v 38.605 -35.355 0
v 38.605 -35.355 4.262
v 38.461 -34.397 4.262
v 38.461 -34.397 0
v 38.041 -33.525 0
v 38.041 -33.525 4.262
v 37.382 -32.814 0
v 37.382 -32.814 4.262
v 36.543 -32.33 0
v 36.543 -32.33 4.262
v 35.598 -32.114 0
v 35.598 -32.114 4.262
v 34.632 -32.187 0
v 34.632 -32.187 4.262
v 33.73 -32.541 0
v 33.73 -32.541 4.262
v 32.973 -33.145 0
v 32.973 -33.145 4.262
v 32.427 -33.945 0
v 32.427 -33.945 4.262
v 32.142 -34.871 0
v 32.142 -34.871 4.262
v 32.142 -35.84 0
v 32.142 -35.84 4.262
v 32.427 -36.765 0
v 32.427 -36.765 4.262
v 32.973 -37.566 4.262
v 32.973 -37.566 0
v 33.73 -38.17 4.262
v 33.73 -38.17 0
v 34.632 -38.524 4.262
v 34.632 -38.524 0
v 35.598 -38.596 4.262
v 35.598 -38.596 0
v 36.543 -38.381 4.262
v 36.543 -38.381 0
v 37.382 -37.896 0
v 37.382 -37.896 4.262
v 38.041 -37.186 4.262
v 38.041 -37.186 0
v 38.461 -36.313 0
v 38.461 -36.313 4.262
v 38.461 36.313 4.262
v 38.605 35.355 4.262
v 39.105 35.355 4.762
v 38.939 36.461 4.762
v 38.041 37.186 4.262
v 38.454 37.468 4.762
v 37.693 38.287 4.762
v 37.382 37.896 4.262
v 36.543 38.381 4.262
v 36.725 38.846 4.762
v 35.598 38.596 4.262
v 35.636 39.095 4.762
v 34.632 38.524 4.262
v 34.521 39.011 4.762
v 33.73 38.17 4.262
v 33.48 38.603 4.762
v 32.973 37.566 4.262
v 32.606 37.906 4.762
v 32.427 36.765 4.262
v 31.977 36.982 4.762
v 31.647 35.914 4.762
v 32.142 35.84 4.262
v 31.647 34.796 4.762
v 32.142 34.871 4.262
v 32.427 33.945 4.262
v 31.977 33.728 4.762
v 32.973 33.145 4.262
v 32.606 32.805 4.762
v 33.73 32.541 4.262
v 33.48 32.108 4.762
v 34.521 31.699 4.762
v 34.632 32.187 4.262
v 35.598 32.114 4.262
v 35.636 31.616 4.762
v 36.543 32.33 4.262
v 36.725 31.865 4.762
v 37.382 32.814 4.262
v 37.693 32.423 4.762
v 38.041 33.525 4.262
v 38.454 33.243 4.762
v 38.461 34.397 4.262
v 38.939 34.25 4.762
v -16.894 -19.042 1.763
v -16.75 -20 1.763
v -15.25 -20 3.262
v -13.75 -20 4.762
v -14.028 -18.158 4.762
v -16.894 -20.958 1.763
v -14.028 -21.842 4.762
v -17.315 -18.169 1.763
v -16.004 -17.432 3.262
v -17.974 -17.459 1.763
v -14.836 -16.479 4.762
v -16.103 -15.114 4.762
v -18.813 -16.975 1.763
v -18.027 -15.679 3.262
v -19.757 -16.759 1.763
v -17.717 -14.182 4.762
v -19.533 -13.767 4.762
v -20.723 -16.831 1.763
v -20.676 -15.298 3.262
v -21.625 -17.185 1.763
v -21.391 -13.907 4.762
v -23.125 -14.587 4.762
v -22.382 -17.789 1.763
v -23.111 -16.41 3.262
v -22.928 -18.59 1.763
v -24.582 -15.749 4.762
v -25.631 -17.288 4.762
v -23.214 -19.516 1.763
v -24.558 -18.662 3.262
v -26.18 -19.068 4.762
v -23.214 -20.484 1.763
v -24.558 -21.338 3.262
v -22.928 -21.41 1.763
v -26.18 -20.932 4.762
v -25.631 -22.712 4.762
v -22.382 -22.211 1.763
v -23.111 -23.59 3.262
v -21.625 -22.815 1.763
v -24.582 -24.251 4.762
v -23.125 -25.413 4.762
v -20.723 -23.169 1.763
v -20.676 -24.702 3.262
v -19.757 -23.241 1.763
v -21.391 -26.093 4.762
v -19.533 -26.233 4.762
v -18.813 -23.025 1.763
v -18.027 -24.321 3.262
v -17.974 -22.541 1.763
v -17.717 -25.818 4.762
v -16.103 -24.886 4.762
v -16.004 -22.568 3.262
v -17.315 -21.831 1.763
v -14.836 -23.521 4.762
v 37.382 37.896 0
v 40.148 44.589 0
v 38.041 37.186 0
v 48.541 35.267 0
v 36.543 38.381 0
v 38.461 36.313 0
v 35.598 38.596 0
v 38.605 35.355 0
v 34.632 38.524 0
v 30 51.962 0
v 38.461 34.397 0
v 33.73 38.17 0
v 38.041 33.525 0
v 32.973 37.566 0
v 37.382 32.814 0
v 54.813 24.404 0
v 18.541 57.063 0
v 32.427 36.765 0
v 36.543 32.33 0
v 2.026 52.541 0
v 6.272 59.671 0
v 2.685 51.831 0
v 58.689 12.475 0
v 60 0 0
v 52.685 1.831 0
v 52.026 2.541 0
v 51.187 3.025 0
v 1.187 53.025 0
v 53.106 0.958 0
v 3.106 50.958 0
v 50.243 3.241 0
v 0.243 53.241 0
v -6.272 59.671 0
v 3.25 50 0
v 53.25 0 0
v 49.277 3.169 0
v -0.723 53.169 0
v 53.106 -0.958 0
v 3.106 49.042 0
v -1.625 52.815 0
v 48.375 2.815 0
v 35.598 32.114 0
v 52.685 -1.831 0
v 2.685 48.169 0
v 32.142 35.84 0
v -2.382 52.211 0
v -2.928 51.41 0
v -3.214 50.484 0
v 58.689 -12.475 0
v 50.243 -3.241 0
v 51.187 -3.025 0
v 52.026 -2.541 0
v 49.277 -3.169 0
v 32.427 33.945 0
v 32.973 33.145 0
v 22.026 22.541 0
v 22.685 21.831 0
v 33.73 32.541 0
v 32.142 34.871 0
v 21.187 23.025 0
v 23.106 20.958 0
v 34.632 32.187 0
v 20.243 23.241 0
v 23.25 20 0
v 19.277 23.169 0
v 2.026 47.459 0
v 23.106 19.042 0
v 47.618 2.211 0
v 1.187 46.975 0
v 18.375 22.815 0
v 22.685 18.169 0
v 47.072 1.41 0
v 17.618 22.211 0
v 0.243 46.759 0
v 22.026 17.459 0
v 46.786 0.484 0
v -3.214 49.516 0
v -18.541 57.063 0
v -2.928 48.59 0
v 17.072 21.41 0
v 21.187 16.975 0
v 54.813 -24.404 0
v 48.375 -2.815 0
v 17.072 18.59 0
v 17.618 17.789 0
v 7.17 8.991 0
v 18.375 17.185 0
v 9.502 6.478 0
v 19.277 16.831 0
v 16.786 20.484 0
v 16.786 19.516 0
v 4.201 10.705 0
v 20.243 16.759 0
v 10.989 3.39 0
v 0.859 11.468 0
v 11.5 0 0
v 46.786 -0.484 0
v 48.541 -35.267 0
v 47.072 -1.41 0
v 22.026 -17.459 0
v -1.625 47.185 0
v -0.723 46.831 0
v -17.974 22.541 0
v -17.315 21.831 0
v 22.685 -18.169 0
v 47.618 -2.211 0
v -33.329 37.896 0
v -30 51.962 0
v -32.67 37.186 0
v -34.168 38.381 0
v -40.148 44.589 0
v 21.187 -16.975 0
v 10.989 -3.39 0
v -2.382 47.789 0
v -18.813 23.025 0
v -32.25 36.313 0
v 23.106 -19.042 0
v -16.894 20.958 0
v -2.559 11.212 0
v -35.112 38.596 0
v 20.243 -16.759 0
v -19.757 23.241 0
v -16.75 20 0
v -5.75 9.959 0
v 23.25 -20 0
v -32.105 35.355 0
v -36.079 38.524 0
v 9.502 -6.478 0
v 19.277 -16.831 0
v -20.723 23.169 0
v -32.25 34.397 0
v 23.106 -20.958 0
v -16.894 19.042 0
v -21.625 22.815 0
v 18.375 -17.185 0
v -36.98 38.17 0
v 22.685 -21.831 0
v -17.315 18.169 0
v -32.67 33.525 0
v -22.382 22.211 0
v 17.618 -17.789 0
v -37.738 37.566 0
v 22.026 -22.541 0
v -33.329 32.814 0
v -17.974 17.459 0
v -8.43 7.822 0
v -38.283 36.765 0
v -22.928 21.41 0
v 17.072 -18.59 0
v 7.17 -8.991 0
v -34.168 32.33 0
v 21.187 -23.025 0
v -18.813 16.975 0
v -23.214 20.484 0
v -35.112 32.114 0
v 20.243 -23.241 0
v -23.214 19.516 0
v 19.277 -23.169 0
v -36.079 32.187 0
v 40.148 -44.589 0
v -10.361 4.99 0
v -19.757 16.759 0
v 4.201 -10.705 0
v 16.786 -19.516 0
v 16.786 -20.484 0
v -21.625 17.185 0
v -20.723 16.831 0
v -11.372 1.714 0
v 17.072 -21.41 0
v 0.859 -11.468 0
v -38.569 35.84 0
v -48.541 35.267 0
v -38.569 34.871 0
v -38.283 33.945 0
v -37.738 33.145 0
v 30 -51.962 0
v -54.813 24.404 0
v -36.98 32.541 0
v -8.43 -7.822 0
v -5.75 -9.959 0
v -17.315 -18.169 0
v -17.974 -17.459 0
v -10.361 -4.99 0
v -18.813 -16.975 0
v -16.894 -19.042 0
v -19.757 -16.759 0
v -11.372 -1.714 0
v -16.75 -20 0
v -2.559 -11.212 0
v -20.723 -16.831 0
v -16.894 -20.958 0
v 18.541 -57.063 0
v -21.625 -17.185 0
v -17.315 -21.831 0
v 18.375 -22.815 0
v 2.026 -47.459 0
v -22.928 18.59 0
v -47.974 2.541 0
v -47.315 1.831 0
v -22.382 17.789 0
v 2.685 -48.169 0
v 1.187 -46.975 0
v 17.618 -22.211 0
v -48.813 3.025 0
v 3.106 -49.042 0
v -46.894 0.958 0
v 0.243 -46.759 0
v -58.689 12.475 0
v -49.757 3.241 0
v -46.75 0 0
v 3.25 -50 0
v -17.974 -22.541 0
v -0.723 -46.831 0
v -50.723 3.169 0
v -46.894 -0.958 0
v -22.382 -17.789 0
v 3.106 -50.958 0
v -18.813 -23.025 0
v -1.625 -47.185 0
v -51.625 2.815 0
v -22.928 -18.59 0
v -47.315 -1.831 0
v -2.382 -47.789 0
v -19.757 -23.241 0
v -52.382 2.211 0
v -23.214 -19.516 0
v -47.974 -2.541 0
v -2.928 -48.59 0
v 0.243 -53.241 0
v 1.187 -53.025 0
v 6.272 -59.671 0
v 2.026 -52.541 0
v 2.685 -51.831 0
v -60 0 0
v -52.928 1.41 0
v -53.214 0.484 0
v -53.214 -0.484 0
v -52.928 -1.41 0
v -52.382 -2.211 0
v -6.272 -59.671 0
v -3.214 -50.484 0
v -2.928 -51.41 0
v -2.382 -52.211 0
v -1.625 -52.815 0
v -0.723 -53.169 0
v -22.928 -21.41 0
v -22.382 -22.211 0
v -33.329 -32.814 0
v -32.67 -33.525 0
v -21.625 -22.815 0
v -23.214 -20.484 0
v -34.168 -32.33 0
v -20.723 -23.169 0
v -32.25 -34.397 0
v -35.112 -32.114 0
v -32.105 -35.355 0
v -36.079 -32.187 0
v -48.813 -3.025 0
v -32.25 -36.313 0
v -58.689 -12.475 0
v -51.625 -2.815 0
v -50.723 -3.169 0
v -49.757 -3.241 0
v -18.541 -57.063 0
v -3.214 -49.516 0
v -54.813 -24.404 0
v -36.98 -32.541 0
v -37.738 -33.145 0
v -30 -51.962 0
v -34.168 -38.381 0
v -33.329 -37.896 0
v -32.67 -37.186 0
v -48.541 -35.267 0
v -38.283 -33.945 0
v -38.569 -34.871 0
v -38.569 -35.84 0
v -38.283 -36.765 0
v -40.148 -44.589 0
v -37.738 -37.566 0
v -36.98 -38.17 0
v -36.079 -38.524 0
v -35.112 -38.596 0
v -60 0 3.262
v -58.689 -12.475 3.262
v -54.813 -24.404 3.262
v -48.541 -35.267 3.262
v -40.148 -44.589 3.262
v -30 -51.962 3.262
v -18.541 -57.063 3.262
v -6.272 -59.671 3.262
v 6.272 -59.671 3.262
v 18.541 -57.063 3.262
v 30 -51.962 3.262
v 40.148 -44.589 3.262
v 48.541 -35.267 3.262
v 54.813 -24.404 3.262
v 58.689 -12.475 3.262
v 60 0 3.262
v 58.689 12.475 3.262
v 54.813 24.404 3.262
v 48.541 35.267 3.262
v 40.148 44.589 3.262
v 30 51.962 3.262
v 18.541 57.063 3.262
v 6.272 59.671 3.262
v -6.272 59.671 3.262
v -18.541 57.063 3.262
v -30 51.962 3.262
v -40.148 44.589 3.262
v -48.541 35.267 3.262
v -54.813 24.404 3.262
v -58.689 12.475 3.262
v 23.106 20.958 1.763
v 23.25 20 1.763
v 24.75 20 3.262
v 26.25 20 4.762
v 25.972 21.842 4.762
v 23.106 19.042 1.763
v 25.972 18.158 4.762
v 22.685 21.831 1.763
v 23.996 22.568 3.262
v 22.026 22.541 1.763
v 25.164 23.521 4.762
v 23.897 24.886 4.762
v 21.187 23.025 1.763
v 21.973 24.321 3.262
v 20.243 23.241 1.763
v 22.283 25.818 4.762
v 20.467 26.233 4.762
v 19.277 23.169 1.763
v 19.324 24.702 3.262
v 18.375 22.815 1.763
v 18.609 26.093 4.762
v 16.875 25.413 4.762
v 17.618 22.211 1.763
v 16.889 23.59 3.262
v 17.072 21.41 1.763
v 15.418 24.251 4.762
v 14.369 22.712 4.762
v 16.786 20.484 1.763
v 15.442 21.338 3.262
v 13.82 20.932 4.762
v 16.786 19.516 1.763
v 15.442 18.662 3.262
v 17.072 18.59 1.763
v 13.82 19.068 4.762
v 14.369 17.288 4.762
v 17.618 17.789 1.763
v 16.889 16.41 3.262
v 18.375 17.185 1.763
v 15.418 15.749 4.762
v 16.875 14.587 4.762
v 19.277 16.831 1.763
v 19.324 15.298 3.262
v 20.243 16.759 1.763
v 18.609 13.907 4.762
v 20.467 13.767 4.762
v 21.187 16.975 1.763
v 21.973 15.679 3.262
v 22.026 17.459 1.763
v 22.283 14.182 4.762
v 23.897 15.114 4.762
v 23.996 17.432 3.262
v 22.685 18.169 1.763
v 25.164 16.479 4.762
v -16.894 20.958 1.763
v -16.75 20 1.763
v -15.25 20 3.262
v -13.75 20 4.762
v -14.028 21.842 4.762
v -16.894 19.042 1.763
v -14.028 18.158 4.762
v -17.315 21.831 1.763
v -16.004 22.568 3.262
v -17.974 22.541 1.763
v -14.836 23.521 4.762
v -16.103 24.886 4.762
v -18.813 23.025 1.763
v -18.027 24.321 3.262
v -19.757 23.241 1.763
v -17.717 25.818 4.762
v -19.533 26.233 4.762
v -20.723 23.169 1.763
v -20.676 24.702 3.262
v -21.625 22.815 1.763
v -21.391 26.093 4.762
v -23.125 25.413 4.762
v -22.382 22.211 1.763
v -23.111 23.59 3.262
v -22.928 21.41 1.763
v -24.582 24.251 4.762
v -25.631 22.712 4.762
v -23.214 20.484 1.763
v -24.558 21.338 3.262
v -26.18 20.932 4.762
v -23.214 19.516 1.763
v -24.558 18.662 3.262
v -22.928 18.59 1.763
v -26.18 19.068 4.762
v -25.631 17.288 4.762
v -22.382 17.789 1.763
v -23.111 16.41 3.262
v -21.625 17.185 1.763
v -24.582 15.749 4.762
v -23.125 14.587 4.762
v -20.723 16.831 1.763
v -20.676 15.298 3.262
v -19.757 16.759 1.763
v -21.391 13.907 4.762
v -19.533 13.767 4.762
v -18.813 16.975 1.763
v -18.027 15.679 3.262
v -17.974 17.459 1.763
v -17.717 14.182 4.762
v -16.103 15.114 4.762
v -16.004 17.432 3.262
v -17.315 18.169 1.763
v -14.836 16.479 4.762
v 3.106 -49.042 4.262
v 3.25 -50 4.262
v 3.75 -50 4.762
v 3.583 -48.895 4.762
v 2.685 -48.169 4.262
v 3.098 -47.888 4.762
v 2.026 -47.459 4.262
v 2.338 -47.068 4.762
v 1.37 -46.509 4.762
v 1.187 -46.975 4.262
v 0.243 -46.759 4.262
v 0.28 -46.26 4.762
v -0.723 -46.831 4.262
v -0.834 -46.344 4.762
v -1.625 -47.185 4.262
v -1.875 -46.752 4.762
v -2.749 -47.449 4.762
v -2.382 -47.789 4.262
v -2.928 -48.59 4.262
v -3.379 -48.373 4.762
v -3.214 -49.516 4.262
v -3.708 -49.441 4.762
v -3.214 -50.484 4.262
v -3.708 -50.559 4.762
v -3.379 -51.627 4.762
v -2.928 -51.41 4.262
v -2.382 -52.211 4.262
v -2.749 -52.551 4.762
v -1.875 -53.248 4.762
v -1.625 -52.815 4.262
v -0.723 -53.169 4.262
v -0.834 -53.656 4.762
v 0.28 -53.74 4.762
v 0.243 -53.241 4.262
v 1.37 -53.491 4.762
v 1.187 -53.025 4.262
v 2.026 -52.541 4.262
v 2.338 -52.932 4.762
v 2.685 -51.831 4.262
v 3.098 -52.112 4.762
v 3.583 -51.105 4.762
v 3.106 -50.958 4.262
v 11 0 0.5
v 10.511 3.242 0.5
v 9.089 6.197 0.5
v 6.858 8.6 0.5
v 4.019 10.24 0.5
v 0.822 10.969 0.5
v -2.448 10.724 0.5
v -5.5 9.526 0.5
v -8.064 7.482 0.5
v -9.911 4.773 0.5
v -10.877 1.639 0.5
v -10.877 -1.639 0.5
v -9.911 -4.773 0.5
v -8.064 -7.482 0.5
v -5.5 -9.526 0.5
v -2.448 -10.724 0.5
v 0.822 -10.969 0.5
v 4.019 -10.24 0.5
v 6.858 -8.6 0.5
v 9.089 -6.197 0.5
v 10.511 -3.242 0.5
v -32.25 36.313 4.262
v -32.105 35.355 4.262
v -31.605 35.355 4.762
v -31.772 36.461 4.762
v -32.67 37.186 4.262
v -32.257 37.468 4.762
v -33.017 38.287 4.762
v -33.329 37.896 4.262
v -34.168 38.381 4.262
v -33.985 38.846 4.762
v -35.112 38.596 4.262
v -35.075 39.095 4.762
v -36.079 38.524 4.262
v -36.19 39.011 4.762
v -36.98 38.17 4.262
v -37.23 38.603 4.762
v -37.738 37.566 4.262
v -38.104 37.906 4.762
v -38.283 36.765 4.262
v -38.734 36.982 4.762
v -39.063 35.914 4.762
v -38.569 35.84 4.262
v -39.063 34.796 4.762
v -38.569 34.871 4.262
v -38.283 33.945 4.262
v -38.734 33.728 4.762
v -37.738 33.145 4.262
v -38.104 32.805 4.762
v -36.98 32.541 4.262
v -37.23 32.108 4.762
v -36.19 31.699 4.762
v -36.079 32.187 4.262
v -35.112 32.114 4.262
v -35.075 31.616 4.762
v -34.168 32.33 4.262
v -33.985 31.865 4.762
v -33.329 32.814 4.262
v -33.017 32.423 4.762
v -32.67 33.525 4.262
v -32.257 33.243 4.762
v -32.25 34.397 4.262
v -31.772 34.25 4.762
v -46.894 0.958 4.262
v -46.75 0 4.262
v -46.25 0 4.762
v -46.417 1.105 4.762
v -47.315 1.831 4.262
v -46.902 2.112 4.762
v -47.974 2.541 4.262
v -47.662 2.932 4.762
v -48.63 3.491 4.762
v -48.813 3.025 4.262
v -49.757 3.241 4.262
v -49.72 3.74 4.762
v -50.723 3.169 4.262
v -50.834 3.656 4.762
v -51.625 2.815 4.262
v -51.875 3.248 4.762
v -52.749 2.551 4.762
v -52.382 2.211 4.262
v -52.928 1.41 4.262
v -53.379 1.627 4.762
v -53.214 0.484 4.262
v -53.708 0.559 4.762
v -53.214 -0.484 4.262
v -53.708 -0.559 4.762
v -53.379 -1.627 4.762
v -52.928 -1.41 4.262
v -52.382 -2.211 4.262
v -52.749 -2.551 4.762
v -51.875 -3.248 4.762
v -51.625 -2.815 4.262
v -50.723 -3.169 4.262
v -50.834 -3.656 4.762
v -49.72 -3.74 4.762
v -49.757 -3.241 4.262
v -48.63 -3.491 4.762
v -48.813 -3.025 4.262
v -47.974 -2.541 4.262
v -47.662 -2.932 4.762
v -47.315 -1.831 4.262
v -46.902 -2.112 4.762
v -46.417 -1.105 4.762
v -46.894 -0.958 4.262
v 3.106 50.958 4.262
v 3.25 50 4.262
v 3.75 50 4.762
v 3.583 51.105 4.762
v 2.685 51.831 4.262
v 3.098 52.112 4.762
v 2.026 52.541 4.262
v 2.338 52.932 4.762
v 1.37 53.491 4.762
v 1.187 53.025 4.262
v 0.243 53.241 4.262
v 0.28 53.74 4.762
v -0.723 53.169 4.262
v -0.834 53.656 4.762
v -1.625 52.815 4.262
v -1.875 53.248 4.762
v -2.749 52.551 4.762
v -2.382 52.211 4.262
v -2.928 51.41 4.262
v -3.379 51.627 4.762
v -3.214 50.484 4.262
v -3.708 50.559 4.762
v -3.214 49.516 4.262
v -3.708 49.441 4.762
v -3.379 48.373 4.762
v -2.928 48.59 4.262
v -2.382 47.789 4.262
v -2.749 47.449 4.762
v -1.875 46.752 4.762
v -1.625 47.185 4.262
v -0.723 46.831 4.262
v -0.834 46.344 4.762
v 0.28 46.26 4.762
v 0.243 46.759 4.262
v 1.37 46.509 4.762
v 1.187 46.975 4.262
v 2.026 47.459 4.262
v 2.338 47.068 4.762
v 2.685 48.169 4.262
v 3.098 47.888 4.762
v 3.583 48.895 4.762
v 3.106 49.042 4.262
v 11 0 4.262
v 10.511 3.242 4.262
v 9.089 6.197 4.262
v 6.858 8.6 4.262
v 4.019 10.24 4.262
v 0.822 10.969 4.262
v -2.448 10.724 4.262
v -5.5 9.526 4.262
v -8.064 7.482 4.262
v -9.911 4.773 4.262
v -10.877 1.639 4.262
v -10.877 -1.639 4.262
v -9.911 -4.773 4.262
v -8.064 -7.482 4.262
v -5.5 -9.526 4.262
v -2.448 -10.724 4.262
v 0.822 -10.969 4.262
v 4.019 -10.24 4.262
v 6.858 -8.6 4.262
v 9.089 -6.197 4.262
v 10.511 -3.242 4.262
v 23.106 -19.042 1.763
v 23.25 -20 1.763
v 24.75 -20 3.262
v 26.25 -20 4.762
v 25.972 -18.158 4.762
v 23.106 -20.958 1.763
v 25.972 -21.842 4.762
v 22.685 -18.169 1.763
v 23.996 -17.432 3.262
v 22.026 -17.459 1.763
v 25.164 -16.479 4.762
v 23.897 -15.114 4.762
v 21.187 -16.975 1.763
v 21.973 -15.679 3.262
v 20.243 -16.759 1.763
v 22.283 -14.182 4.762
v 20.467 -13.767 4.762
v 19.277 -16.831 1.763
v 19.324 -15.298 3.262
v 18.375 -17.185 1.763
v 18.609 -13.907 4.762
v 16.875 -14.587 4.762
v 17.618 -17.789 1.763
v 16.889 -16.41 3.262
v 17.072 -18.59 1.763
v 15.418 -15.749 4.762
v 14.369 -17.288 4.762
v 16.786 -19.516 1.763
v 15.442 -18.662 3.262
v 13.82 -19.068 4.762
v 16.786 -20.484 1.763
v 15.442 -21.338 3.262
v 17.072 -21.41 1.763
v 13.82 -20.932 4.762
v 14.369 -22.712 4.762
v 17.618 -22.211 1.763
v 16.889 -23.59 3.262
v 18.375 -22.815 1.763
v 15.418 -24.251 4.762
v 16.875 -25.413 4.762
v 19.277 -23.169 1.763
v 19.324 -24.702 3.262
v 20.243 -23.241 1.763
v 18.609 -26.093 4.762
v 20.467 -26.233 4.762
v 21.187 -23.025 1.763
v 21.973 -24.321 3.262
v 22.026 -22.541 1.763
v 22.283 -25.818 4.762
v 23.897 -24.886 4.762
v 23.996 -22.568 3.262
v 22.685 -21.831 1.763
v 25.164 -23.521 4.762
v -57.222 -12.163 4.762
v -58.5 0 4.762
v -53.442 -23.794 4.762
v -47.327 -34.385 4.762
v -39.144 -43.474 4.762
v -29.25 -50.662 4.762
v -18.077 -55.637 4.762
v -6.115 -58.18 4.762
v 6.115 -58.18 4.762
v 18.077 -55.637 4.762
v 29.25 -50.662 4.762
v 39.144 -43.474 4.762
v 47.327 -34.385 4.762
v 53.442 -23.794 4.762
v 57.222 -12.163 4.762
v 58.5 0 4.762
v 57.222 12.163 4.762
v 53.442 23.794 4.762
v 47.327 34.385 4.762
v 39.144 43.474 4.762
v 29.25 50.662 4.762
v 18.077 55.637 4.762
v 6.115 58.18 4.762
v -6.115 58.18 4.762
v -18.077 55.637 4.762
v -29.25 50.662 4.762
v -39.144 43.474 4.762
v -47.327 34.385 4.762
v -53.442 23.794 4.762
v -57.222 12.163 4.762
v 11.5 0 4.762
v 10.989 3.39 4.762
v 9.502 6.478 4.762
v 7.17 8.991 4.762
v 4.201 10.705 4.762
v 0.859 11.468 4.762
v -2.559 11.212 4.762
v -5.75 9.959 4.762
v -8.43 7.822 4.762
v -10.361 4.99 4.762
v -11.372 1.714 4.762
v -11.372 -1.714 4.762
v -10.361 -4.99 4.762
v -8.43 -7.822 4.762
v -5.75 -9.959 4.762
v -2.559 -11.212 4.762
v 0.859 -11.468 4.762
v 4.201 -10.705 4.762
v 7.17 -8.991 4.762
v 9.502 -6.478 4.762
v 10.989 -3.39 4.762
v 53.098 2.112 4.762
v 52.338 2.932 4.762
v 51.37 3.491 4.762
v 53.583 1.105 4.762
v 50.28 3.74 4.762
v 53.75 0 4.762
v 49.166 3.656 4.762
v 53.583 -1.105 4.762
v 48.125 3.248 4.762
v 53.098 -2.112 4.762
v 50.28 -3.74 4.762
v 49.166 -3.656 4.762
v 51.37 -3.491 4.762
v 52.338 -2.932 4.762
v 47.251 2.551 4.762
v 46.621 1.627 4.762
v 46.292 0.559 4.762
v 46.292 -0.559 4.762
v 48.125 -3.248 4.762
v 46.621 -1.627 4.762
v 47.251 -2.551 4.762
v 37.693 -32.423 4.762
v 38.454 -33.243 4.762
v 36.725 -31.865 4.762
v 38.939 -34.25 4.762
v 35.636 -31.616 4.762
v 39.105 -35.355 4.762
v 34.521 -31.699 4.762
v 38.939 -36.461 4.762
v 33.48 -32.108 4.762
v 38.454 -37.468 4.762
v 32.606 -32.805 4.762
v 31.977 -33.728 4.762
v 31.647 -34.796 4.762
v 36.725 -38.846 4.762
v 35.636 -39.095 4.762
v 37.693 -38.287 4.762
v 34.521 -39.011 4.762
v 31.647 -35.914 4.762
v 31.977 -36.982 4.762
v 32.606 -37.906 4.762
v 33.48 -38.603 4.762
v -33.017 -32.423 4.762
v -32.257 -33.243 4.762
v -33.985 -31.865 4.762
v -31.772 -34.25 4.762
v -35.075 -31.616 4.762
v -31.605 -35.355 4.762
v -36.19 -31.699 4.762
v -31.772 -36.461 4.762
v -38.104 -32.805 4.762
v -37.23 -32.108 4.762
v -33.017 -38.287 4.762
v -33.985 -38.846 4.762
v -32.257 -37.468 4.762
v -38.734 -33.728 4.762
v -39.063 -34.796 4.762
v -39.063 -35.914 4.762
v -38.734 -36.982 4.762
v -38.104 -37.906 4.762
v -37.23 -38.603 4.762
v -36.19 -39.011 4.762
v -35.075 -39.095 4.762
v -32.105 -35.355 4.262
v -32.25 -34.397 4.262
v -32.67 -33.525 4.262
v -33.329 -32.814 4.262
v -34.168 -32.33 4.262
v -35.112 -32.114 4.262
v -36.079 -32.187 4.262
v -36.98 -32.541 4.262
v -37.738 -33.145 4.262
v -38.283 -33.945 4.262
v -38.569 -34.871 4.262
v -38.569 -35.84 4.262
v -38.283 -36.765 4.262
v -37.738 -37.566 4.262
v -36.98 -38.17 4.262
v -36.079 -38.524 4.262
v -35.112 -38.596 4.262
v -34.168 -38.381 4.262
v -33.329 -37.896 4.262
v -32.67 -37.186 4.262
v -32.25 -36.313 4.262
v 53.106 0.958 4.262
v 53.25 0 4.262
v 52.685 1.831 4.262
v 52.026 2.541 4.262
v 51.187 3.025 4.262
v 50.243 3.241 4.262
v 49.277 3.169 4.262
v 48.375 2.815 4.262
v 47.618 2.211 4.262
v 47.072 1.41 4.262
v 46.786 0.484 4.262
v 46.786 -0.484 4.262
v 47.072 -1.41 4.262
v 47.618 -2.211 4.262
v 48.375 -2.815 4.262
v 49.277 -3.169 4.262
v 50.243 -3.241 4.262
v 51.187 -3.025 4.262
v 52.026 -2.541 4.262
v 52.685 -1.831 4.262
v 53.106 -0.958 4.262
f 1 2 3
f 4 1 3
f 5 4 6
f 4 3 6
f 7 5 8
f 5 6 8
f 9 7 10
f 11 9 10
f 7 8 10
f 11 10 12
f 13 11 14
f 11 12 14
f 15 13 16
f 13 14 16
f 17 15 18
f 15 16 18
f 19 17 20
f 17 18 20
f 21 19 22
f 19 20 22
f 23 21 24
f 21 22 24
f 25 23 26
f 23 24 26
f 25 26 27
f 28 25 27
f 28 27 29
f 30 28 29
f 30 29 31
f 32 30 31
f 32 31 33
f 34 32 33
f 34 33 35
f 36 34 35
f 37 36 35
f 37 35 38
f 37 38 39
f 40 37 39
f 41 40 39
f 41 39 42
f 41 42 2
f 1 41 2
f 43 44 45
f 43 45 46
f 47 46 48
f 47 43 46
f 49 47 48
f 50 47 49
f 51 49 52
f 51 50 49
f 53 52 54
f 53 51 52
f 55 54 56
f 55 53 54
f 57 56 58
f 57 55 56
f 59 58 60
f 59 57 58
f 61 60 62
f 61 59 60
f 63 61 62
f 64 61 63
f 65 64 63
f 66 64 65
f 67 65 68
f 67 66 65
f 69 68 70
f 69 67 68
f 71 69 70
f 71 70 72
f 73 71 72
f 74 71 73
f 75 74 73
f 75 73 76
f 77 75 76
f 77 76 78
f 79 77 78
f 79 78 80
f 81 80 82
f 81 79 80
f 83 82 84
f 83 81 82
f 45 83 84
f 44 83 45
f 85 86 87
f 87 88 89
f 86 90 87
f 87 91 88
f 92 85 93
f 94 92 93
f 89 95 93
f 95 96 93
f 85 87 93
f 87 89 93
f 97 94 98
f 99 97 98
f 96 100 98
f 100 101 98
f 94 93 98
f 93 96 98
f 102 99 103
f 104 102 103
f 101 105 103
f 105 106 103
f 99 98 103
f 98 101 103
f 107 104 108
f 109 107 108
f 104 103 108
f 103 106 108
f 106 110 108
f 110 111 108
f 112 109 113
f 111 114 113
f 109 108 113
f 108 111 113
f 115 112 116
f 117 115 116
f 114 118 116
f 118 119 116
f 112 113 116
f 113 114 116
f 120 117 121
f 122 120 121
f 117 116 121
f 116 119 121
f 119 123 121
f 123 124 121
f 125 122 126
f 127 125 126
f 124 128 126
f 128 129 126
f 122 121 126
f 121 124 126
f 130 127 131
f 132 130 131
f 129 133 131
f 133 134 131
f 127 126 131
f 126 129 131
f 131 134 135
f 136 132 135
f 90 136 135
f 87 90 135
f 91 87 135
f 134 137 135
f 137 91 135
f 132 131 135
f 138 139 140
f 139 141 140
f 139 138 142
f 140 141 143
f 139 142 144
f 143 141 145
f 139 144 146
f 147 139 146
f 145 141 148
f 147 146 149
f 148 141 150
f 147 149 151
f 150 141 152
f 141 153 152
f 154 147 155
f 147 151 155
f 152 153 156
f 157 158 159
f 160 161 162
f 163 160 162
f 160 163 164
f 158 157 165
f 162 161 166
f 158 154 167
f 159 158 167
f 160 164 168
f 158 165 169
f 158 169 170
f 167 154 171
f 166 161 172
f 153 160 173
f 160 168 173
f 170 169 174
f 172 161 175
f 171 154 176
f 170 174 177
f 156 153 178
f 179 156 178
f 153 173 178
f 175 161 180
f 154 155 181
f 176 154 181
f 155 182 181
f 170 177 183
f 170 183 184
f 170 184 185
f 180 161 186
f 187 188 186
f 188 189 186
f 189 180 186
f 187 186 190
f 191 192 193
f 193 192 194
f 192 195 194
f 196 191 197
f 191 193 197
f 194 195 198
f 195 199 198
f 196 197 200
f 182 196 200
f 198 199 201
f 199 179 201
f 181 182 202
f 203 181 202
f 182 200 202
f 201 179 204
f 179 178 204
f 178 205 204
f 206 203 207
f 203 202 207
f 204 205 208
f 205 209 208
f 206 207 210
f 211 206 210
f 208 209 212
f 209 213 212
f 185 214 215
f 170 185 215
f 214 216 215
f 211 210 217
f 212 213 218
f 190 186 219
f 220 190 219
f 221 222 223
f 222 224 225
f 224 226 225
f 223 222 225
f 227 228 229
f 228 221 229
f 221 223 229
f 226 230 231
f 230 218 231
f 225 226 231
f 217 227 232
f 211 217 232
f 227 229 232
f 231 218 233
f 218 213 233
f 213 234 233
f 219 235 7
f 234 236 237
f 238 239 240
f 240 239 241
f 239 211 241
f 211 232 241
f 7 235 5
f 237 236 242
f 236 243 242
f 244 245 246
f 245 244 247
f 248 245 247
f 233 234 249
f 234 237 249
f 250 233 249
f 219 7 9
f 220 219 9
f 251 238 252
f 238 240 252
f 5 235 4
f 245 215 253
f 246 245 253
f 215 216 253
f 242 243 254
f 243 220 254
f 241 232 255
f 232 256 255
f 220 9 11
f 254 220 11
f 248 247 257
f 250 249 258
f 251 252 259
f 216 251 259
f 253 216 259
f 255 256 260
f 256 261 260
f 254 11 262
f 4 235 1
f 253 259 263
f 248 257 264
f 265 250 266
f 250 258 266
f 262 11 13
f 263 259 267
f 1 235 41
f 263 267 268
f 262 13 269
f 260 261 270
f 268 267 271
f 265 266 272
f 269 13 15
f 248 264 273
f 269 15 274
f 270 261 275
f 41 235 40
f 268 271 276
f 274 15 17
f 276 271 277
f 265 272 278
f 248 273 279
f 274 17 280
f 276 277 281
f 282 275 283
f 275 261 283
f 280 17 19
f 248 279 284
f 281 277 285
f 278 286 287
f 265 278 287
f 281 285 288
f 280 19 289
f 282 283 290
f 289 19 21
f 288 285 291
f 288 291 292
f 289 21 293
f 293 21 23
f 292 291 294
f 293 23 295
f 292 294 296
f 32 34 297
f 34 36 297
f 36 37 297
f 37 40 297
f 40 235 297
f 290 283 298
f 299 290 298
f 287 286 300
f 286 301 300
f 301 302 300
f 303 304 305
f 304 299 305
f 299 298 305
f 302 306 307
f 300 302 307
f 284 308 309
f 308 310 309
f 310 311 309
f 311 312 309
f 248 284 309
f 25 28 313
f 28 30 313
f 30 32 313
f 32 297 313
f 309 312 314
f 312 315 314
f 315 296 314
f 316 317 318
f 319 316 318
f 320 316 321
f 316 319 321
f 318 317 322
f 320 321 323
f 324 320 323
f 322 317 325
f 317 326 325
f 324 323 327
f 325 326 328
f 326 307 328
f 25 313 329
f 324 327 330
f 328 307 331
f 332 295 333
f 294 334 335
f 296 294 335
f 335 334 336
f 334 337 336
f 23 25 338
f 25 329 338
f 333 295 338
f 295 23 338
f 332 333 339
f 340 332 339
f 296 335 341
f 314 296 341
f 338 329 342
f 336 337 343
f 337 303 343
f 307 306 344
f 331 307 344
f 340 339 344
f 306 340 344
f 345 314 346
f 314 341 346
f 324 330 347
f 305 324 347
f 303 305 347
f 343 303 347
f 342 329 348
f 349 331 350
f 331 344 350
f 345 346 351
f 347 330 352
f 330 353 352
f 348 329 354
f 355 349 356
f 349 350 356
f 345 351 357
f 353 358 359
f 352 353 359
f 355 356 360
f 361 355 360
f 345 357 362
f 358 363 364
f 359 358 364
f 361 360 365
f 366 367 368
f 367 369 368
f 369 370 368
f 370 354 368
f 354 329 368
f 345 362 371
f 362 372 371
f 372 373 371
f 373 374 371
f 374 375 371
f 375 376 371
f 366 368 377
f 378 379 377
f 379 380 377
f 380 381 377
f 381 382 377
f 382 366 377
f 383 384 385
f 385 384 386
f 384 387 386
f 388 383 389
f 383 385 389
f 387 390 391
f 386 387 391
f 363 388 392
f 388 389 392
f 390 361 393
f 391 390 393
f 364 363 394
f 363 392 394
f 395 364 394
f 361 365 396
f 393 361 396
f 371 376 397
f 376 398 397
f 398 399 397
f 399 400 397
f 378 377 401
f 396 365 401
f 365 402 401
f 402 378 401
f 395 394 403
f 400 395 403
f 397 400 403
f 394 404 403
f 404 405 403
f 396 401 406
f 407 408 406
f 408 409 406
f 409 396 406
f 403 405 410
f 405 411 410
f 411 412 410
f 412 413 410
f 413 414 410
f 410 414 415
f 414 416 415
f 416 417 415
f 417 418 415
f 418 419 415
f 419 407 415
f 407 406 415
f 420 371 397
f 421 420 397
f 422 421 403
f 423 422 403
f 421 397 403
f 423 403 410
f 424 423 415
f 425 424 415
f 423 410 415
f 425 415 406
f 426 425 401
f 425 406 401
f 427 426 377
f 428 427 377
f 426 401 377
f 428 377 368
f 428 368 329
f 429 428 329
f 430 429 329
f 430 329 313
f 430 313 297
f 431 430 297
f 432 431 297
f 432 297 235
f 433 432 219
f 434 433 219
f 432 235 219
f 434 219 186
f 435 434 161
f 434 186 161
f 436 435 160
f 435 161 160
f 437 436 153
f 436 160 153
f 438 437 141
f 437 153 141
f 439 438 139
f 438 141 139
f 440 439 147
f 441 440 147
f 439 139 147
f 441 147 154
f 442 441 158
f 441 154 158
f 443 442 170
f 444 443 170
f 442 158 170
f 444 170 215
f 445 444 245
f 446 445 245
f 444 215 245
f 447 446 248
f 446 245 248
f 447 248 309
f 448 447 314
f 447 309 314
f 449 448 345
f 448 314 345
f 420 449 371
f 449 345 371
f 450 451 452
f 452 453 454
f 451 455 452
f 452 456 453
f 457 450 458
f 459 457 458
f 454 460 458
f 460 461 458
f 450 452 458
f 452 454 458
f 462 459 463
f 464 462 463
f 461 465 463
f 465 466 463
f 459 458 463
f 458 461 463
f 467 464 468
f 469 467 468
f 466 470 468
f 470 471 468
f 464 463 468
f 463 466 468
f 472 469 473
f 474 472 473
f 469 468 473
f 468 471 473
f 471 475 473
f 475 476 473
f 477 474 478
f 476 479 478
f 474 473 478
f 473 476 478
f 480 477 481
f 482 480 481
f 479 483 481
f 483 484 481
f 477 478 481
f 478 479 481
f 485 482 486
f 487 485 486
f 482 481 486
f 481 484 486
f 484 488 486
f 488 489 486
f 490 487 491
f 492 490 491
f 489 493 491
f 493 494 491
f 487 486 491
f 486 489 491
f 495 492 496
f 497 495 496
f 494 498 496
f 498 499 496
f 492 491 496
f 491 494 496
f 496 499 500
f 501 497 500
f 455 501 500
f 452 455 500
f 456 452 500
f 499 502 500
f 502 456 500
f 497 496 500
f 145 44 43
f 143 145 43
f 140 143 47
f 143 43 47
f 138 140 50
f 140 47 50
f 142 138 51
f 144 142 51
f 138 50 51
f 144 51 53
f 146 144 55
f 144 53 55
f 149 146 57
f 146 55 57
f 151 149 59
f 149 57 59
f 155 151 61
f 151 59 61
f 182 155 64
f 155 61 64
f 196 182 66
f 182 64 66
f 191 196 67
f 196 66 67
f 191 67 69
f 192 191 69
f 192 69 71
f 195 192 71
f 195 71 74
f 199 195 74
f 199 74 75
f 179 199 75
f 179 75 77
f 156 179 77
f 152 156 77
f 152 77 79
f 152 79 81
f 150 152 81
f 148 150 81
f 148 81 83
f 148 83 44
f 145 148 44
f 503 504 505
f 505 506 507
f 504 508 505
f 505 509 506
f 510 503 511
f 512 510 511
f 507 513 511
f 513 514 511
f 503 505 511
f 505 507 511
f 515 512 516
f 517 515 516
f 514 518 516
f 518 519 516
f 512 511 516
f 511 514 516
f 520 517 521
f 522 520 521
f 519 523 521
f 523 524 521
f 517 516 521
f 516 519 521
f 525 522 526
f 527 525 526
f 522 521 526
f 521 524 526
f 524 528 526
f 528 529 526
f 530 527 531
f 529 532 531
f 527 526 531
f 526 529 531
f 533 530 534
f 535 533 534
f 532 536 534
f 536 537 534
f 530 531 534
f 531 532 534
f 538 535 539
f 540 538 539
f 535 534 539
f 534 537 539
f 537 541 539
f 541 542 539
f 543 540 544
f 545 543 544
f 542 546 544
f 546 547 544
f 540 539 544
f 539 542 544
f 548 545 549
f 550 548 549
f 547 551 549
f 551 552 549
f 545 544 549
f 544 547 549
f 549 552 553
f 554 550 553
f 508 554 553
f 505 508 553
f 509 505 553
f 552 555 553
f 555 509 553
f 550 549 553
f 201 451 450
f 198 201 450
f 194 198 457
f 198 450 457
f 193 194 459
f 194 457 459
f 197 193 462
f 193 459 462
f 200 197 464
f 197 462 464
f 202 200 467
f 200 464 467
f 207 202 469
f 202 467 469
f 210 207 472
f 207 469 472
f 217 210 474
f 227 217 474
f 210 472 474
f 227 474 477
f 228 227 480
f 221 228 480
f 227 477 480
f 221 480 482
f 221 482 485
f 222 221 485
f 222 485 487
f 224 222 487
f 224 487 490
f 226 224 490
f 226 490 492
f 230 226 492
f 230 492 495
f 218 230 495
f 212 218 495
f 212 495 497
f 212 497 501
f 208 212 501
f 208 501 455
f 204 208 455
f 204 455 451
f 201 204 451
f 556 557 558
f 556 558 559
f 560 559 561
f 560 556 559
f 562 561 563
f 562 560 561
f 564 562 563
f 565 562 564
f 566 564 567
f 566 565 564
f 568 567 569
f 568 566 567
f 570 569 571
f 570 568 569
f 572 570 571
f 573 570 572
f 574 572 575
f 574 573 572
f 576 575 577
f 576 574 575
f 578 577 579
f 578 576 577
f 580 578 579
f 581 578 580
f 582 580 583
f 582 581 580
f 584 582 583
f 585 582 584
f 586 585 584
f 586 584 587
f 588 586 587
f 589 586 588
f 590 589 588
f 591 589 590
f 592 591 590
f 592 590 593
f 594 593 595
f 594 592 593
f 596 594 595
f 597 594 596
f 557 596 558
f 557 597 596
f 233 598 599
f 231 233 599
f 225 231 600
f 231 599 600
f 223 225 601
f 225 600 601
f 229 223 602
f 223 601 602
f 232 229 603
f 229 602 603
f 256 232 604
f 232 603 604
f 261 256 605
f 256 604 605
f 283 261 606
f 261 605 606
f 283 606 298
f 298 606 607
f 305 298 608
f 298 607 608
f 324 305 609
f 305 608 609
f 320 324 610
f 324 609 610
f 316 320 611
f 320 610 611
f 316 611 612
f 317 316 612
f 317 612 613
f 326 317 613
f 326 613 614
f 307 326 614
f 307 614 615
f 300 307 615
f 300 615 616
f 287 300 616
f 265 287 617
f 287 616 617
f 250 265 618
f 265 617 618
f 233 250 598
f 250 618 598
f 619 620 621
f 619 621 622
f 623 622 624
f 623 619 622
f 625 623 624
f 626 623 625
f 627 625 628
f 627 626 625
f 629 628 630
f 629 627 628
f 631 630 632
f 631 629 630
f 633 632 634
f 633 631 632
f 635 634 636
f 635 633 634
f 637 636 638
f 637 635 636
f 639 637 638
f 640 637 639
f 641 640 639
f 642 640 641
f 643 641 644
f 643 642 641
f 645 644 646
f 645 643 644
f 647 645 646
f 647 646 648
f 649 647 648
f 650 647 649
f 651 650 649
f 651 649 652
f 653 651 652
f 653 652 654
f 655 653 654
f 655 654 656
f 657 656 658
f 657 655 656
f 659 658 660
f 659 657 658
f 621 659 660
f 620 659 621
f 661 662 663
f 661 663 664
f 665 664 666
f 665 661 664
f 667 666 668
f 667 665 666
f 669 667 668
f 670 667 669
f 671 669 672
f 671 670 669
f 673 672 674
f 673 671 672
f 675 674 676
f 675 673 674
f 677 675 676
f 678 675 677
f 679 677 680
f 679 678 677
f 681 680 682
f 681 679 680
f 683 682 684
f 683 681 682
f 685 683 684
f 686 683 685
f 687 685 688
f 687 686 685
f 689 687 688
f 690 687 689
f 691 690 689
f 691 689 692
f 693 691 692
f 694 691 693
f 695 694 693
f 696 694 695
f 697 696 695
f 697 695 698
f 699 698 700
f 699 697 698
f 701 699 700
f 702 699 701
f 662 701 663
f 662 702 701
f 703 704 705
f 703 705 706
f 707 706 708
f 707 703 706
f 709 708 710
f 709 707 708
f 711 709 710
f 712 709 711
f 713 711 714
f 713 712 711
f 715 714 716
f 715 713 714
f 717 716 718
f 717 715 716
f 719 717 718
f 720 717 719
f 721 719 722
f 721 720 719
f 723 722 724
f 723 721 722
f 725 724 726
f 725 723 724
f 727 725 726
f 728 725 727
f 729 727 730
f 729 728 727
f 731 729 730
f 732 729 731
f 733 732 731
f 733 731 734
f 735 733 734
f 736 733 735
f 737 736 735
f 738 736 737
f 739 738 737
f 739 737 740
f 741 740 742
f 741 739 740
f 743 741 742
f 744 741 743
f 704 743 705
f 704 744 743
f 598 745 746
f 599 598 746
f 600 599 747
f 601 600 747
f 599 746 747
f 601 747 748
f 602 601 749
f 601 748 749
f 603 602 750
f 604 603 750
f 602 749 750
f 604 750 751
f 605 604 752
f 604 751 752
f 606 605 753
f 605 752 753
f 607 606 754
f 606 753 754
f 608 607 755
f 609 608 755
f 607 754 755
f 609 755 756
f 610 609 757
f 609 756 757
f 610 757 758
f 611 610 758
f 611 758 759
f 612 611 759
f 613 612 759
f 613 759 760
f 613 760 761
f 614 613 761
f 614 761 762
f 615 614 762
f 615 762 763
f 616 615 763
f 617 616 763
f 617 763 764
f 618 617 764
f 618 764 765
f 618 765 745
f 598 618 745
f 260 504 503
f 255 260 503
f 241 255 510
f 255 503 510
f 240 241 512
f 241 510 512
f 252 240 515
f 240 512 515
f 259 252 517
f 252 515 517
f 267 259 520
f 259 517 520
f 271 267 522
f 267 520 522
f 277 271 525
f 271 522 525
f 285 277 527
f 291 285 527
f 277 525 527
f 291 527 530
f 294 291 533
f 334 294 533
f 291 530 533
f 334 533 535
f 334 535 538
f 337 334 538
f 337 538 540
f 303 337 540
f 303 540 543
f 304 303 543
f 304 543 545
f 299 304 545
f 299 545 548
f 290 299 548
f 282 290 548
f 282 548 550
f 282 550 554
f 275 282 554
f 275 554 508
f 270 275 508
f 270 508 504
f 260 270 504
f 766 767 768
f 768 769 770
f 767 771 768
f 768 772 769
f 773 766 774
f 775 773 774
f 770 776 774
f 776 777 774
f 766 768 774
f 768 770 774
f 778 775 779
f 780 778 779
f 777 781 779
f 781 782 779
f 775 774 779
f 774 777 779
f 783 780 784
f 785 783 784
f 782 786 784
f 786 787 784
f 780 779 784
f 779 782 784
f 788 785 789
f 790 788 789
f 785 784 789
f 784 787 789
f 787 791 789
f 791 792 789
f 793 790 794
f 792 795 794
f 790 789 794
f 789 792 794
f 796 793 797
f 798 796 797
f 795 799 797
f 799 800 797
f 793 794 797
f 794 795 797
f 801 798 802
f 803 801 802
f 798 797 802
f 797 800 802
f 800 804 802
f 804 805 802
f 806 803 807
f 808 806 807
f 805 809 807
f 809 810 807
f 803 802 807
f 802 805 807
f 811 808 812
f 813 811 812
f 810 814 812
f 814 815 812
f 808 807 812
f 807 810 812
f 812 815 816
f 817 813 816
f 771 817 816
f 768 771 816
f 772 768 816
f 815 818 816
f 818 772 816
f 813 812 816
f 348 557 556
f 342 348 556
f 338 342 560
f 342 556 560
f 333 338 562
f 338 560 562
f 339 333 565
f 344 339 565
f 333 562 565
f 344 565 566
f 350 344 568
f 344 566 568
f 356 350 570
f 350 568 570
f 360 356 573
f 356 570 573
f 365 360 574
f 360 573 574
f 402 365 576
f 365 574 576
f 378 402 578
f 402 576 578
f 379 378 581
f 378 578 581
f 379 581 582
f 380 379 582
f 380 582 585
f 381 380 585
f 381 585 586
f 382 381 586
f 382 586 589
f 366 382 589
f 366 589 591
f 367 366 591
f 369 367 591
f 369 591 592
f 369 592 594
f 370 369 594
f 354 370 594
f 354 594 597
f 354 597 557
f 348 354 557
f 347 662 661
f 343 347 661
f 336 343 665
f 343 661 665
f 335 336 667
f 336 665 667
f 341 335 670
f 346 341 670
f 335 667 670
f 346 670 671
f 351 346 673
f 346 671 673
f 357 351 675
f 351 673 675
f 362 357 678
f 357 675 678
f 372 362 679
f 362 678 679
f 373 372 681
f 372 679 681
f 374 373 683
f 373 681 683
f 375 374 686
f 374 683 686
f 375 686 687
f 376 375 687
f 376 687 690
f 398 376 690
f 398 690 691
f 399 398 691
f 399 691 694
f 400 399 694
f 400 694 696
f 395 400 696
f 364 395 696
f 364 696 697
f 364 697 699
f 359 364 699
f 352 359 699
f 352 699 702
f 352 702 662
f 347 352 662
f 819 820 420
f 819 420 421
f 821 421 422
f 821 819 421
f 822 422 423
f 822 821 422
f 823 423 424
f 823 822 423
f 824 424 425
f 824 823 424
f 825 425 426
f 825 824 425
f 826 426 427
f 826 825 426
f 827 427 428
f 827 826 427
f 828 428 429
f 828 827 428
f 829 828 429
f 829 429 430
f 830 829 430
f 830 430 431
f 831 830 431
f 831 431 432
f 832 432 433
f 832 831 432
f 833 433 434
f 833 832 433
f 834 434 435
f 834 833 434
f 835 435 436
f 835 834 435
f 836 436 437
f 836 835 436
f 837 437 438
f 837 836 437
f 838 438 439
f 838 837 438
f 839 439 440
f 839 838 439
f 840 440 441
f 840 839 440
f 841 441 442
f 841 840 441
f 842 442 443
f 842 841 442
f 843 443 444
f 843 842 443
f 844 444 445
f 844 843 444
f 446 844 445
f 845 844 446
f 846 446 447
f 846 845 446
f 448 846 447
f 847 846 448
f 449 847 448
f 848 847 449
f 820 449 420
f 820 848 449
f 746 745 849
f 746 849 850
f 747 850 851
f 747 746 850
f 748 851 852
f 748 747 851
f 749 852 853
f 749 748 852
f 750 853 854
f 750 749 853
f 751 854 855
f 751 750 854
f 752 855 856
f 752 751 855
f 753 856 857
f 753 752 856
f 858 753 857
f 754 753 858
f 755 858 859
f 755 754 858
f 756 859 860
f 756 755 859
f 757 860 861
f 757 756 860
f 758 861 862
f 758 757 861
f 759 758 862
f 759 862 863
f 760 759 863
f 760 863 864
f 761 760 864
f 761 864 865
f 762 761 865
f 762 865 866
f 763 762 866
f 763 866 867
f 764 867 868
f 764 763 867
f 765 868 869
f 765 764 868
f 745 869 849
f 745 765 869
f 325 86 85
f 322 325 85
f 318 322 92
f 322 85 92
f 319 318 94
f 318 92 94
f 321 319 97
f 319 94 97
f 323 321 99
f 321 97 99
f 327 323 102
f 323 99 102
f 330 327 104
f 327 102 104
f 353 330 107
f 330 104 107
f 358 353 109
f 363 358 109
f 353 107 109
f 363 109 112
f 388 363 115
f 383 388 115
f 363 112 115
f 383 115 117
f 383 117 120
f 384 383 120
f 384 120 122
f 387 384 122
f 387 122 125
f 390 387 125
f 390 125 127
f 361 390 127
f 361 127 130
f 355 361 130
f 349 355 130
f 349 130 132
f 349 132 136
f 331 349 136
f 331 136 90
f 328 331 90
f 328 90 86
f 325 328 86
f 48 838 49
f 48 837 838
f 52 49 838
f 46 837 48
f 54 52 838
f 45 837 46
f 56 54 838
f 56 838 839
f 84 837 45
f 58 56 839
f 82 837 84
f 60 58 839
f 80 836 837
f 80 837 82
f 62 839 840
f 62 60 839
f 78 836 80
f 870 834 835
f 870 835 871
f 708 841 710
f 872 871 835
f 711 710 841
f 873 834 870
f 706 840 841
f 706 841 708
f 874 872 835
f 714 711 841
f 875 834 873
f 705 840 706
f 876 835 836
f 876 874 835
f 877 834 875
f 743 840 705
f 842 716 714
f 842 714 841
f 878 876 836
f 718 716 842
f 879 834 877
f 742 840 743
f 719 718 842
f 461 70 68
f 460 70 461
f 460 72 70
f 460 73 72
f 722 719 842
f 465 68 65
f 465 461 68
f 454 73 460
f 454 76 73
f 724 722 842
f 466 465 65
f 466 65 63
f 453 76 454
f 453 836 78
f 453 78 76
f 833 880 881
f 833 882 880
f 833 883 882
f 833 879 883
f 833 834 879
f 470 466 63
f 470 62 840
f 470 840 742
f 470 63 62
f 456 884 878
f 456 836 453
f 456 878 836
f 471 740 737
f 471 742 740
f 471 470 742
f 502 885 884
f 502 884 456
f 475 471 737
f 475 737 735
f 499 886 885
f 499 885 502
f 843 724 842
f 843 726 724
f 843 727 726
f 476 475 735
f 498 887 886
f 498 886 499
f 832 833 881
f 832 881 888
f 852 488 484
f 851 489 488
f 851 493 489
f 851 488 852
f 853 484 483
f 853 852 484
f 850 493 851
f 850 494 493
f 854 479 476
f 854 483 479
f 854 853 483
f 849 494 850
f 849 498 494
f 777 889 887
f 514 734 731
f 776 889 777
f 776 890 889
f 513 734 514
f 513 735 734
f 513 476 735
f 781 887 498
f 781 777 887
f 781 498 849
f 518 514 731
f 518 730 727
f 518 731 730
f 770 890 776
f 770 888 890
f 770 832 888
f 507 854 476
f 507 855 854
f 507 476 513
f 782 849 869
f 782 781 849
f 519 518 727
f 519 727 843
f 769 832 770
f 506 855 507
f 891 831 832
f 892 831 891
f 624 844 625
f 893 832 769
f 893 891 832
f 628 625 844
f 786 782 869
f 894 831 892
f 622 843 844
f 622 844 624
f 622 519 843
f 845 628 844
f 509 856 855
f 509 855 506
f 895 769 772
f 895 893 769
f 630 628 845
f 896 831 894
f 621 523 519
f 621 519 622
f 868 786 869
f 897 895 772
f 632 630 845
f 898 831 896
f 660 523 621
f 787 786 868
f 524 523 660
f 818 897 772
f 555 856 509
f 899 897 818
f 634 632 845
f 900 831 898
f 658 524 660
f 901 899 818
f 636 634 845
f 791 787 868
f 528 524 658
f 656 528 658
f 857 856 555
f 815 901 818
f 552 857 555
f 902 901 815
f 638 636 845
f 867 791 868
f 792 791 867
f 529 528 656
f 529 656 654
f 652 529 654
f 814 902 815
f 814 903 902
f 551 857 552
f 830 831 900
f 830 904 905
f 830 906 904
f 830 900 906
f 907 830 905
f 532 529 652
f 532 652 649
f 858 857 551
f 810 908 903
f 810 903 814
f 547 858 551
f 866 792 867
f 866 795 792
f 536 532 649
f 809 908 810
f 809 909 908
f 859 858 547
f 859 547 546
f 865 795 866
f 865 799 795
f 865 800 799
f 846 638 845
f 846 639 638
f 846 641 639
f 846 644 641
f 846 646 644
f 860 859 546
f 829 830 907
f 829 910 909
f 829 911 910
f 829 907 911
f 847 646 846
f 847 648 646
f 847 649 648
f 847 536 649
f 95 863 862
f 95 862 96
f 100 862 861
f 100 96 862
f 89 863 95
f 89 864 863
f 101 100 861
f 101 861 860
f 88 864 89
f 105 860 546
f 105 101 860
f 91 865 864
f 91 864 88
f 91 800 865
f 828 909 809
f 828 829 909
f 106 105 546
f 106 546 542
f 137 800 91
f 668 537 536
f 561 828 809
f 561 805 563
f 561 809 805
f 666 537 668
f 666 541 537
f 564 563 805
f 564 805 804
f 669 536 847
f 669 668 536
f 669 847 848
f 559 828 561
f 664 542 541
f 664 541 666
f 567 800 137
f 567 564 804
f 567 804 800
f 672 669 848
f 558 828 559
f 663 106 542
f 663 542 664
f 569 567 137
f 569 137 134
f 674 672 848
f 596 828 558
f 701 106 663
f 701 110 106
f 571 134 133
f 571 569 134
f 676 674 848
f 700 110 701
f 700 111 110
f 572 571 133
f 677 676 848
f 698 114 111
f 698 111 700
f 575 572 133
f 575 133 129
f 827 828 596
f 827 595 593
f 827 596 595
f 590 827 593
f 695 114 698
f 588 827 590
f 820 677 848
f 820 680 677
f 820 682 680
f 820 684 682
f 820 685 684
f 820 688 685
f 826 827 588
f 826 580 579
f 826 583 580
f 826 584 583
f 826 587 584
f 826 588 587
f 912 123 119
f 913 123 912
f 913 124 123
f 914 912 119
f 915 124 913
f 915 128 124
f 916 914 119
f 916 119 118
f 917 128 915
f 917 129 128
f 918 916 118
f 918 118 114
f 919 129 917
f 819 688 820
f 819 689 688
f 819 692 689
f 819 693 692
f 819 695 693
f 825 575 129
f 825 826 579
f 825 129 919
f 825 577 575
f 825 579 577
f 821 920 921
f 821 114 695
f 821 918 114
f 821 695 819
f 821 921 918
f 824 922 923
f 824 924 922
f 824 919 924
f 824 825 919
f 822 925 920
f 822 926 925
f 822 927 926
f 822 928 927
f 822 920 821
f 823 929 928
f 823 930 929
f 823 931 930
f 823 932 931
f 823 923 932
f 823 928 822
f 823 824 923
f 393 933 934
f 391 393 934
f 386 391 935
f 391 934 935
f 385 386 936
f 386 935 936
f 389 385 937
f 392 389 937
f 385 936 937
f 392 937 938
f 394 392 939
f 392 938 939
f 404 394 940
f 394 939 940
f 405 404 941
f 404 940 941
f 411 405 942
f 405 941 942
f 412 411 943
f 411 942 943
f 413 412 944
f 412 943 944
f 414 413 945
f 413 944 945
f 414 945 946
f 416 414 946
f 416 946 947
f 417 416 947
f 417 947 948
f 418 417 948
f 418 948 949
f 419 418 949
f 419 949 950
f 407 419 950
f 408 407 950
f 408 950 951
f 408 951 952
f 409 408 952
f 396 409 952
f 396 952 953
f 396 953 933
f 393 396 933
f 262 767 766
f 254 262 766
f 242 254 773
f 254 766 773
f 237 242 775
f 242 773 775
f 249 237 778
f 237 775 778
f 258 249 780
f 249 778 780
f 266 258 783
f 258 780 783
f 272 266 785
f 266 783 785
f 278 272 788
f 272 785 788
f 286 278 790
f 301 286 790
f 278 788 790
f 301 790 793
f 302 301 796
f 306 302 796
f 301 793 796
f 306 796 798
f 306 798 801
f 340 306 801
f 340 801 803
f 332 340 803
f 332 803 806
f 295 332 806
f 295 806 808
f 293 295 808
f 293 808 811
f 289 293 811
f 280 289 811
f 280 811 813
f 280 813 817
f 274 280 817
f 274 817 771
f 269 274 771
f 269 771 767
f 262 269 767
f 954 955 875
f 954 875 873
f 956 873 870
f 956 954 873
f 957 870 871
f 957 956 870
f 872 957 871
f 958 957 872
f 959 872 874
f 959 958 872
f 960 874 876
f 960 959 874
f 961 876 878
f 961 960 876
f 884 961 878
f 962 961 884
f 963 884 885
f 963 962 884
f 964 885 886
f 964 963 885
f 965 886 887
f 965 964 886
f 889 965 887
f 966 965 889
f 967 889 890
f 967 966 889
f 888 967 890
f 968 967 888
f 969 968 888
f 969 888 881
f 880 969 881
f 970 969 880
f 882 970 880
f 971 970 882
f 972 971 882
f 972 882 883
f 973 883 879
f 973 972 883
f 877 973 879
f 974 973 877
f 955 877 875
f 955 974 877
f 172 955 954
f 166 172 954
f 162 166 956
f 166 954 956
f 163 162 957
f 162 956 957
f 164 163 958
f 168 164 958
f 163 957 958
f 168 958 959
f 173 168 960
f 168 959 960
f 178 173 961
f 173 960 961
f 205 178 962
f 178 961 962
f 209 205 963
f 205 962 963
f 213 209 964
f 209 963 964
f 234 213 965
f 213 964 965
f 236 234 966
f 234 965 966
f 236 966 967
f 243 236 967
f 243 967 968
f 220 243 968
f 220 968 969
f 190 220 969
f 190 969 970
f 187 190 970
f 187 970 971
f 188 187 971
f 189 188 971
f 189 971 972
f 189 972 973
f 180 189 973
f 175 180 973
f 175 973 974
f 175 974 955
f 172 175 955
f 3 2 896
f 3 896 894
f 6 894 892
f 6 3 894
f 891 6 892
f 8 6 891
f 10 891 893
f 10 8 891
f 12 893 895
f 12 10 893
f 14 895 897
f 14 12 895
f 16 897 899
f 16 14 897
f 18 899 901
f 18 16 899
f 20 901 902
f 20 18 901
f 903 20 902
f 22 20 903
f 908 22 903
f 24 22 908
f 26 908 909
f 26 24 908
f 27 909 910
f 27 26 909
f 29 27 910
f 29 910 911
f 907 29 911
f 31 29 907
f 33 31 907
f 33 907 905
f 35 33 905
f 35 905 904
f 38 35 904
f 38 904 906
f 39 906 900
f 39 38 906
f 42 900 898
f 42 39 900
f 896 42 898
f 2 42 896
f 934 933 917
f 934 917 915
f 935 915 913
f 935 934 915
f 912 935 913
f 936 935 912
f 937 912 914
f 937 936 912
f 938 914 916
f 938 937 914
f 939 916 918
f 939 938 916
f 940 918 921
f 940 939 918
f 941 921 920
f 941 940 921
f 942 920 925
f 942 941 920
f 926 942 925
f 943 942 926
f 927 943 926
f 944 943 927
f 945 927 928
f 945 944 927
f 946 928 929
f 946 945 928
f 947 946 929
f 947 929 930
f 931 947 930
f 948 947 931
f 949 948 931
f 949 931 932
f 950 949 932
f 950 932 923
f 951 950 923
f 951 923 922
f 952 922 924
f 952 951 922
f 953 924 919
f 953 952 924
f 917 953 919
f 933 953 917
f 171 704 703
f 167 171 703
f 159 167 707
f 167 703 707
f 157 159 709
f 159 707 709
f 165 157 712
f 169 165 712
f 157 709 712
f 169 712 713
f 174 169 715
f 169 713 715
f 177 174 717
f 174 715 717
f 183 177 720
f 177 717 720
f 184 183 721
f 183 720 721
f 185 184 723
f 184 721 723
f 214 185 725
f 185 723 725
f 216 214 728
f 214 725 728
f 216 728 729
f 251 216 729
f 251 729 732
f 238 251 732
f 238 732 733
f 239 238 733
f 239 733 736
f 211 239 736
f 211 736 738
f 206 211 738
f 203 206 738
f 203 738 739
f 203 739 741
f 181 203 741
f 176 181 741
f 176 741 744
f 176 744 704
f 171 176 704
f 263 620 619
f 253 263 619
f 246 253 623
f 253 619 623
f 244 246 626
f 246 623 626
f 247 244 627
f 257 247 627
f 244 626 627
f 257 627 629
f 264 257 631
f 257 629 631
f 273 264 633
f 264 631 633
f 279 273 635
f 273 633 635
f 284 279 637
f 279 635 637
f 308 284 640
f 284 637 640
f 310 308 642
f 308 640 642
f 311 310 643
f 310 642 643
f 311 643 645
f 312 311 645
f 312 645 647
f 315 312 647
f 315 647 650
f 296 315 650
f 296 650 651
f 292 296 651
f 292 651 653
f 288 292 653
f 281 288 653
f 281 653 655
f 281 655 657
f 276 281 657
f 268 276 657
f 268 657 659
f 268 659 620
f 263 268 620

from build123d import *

# Parameters (mm, degrees)
CROQUIS1_R              = 60
SALIENTE_EXTRUIR1_DEPTH = 4.7625
CROQUIS2_R              = 3.25
CORTAR_EXTRUIR1_DEPTH   = 85.986360119
CHAFL_N1_SIZE           = 1.5
CROQUIS3_R              = 11
CORTAR_EXTRUIR2_DEPTH   = 85.986360119
CROQUIS4_R              = 3.25
CORTAR_EXTRUIR3_DEPTH   = 85.986360119
CHAFL_N2_SIZE           = 0.5
CHAFL_N3_SIZE           = 3


with BuildPart() as part:
    # Croquis1 → Saliente-Extruir1 (new body)
    with BuildSketch(Plane.XY):
        with Locations(Location((0, 0, 0), (0, 0, 180))):
            Circle(CROQUIS1_R)
    extrude(amount=SALIENTE_EXTRUIR1_DEPTH)

    # Croquis2 → Cortar-Extruir1 (cut, through all)
    with BuildSketch(Plane.XY.offset(4.7625)):
        with Locations((50, 0)):
            Circle(CROQUIS2_R)
        with Locations((35.355339059, -35.355339059)):
            Circle(CROQUIS2_R)
        with Locations((0, -50)):
            Circle(CROQUIS2_R)
        with Locations((-35.355339059, -35.355339059)):
            Circle(CROQUIS2_R)
        with Locations((-50, 0)):
            Circle(CROQUIS2_R)
        with Locations((-35.355339059, 35.355339059)):
            Circle(CROQUIS2_R)
        with Locations((0, 50)):
            Circle(CROQUIS2_R)
        with Locations((35.355339059, 35.355339059)):
            Circle(CROQUIS2_R)
    extrude(amount=-CORTAR_EXTRUIR1_DEPTH, mode=Mode.SUBTRACT)

    # Chaflán1
    chafl_n1_edges = [part.edges().sort_by_distance(p)[0] for p in [
        (60, 0, 4.7625),
    ]]
    chamfer(chafl_n1_edges, length=CHAFL_N1_SIZE)

    # Croquis3 → Cortar-Extruir2 (cut, through all)
    with BuildSketch(Plane.XY.offset(4.7625)):
        Circle(CROQUIS3_R)
    extrude(amount=-CORTAR_EXTRUIR2_DEPTH, mode=Mode.SUBTRACT)

    # Croquis4 → Cortar-Extruir3 (cut, through all)
    with BuildSketch(Plane.XY.offset(4.7625)):
        with Locations((20, 20)):
            Circle(CROQUIS4_R)
        with Locations((-20, 20)):
            Circle(CROQUIS4_R)
        with Locations((-20, -20)):
            Circle(CROQUIS4_R)
        with Locations((20, -20)):
            Circle(CROQUIS4_R)
    extrude(amount=-CORTAR_EXTRUIR3_DEPTH, mode=Mode.SUBTRACT)

    # Chaflán2
    chafl_n2_edges = [part.edges().sort_by_distance(p)[0] for p in [
        (32.105339059, -35.355339059, 4.7625),
        (-3.25, -50, 4.7625),
        (-38.605339059, -35.355339059, 4.7625),
        (-53.25, 0, 4.7625),
        (-38.605339059, 35.355339059, 4.7625),
        (-3.25, 50, 4.7625),
        (32.105339059, 35.355339059, 4.7625),
        (-11, 0, 0),
        (-11, 0, 4.7625),
        (46.75, 0, 4.7625),
    ]]
    chamfer(chafl_n2_edges, length=CHAFL_N2_SIZE)

    # Chaflán3
    chafl_n3_edges = [part.edges().sort_by_distance(p)[0] for p in [
        (16.75, 20, 4.7625),
        (-23.25, 20, 4.7625),
        (-23.25, -20, 4.7625),
        (16.75, -20, 4.7625),
    ]]
    chamfer(chafl_n3_edges, length=CHAFL_N3_SIZE)


solid = part.part
